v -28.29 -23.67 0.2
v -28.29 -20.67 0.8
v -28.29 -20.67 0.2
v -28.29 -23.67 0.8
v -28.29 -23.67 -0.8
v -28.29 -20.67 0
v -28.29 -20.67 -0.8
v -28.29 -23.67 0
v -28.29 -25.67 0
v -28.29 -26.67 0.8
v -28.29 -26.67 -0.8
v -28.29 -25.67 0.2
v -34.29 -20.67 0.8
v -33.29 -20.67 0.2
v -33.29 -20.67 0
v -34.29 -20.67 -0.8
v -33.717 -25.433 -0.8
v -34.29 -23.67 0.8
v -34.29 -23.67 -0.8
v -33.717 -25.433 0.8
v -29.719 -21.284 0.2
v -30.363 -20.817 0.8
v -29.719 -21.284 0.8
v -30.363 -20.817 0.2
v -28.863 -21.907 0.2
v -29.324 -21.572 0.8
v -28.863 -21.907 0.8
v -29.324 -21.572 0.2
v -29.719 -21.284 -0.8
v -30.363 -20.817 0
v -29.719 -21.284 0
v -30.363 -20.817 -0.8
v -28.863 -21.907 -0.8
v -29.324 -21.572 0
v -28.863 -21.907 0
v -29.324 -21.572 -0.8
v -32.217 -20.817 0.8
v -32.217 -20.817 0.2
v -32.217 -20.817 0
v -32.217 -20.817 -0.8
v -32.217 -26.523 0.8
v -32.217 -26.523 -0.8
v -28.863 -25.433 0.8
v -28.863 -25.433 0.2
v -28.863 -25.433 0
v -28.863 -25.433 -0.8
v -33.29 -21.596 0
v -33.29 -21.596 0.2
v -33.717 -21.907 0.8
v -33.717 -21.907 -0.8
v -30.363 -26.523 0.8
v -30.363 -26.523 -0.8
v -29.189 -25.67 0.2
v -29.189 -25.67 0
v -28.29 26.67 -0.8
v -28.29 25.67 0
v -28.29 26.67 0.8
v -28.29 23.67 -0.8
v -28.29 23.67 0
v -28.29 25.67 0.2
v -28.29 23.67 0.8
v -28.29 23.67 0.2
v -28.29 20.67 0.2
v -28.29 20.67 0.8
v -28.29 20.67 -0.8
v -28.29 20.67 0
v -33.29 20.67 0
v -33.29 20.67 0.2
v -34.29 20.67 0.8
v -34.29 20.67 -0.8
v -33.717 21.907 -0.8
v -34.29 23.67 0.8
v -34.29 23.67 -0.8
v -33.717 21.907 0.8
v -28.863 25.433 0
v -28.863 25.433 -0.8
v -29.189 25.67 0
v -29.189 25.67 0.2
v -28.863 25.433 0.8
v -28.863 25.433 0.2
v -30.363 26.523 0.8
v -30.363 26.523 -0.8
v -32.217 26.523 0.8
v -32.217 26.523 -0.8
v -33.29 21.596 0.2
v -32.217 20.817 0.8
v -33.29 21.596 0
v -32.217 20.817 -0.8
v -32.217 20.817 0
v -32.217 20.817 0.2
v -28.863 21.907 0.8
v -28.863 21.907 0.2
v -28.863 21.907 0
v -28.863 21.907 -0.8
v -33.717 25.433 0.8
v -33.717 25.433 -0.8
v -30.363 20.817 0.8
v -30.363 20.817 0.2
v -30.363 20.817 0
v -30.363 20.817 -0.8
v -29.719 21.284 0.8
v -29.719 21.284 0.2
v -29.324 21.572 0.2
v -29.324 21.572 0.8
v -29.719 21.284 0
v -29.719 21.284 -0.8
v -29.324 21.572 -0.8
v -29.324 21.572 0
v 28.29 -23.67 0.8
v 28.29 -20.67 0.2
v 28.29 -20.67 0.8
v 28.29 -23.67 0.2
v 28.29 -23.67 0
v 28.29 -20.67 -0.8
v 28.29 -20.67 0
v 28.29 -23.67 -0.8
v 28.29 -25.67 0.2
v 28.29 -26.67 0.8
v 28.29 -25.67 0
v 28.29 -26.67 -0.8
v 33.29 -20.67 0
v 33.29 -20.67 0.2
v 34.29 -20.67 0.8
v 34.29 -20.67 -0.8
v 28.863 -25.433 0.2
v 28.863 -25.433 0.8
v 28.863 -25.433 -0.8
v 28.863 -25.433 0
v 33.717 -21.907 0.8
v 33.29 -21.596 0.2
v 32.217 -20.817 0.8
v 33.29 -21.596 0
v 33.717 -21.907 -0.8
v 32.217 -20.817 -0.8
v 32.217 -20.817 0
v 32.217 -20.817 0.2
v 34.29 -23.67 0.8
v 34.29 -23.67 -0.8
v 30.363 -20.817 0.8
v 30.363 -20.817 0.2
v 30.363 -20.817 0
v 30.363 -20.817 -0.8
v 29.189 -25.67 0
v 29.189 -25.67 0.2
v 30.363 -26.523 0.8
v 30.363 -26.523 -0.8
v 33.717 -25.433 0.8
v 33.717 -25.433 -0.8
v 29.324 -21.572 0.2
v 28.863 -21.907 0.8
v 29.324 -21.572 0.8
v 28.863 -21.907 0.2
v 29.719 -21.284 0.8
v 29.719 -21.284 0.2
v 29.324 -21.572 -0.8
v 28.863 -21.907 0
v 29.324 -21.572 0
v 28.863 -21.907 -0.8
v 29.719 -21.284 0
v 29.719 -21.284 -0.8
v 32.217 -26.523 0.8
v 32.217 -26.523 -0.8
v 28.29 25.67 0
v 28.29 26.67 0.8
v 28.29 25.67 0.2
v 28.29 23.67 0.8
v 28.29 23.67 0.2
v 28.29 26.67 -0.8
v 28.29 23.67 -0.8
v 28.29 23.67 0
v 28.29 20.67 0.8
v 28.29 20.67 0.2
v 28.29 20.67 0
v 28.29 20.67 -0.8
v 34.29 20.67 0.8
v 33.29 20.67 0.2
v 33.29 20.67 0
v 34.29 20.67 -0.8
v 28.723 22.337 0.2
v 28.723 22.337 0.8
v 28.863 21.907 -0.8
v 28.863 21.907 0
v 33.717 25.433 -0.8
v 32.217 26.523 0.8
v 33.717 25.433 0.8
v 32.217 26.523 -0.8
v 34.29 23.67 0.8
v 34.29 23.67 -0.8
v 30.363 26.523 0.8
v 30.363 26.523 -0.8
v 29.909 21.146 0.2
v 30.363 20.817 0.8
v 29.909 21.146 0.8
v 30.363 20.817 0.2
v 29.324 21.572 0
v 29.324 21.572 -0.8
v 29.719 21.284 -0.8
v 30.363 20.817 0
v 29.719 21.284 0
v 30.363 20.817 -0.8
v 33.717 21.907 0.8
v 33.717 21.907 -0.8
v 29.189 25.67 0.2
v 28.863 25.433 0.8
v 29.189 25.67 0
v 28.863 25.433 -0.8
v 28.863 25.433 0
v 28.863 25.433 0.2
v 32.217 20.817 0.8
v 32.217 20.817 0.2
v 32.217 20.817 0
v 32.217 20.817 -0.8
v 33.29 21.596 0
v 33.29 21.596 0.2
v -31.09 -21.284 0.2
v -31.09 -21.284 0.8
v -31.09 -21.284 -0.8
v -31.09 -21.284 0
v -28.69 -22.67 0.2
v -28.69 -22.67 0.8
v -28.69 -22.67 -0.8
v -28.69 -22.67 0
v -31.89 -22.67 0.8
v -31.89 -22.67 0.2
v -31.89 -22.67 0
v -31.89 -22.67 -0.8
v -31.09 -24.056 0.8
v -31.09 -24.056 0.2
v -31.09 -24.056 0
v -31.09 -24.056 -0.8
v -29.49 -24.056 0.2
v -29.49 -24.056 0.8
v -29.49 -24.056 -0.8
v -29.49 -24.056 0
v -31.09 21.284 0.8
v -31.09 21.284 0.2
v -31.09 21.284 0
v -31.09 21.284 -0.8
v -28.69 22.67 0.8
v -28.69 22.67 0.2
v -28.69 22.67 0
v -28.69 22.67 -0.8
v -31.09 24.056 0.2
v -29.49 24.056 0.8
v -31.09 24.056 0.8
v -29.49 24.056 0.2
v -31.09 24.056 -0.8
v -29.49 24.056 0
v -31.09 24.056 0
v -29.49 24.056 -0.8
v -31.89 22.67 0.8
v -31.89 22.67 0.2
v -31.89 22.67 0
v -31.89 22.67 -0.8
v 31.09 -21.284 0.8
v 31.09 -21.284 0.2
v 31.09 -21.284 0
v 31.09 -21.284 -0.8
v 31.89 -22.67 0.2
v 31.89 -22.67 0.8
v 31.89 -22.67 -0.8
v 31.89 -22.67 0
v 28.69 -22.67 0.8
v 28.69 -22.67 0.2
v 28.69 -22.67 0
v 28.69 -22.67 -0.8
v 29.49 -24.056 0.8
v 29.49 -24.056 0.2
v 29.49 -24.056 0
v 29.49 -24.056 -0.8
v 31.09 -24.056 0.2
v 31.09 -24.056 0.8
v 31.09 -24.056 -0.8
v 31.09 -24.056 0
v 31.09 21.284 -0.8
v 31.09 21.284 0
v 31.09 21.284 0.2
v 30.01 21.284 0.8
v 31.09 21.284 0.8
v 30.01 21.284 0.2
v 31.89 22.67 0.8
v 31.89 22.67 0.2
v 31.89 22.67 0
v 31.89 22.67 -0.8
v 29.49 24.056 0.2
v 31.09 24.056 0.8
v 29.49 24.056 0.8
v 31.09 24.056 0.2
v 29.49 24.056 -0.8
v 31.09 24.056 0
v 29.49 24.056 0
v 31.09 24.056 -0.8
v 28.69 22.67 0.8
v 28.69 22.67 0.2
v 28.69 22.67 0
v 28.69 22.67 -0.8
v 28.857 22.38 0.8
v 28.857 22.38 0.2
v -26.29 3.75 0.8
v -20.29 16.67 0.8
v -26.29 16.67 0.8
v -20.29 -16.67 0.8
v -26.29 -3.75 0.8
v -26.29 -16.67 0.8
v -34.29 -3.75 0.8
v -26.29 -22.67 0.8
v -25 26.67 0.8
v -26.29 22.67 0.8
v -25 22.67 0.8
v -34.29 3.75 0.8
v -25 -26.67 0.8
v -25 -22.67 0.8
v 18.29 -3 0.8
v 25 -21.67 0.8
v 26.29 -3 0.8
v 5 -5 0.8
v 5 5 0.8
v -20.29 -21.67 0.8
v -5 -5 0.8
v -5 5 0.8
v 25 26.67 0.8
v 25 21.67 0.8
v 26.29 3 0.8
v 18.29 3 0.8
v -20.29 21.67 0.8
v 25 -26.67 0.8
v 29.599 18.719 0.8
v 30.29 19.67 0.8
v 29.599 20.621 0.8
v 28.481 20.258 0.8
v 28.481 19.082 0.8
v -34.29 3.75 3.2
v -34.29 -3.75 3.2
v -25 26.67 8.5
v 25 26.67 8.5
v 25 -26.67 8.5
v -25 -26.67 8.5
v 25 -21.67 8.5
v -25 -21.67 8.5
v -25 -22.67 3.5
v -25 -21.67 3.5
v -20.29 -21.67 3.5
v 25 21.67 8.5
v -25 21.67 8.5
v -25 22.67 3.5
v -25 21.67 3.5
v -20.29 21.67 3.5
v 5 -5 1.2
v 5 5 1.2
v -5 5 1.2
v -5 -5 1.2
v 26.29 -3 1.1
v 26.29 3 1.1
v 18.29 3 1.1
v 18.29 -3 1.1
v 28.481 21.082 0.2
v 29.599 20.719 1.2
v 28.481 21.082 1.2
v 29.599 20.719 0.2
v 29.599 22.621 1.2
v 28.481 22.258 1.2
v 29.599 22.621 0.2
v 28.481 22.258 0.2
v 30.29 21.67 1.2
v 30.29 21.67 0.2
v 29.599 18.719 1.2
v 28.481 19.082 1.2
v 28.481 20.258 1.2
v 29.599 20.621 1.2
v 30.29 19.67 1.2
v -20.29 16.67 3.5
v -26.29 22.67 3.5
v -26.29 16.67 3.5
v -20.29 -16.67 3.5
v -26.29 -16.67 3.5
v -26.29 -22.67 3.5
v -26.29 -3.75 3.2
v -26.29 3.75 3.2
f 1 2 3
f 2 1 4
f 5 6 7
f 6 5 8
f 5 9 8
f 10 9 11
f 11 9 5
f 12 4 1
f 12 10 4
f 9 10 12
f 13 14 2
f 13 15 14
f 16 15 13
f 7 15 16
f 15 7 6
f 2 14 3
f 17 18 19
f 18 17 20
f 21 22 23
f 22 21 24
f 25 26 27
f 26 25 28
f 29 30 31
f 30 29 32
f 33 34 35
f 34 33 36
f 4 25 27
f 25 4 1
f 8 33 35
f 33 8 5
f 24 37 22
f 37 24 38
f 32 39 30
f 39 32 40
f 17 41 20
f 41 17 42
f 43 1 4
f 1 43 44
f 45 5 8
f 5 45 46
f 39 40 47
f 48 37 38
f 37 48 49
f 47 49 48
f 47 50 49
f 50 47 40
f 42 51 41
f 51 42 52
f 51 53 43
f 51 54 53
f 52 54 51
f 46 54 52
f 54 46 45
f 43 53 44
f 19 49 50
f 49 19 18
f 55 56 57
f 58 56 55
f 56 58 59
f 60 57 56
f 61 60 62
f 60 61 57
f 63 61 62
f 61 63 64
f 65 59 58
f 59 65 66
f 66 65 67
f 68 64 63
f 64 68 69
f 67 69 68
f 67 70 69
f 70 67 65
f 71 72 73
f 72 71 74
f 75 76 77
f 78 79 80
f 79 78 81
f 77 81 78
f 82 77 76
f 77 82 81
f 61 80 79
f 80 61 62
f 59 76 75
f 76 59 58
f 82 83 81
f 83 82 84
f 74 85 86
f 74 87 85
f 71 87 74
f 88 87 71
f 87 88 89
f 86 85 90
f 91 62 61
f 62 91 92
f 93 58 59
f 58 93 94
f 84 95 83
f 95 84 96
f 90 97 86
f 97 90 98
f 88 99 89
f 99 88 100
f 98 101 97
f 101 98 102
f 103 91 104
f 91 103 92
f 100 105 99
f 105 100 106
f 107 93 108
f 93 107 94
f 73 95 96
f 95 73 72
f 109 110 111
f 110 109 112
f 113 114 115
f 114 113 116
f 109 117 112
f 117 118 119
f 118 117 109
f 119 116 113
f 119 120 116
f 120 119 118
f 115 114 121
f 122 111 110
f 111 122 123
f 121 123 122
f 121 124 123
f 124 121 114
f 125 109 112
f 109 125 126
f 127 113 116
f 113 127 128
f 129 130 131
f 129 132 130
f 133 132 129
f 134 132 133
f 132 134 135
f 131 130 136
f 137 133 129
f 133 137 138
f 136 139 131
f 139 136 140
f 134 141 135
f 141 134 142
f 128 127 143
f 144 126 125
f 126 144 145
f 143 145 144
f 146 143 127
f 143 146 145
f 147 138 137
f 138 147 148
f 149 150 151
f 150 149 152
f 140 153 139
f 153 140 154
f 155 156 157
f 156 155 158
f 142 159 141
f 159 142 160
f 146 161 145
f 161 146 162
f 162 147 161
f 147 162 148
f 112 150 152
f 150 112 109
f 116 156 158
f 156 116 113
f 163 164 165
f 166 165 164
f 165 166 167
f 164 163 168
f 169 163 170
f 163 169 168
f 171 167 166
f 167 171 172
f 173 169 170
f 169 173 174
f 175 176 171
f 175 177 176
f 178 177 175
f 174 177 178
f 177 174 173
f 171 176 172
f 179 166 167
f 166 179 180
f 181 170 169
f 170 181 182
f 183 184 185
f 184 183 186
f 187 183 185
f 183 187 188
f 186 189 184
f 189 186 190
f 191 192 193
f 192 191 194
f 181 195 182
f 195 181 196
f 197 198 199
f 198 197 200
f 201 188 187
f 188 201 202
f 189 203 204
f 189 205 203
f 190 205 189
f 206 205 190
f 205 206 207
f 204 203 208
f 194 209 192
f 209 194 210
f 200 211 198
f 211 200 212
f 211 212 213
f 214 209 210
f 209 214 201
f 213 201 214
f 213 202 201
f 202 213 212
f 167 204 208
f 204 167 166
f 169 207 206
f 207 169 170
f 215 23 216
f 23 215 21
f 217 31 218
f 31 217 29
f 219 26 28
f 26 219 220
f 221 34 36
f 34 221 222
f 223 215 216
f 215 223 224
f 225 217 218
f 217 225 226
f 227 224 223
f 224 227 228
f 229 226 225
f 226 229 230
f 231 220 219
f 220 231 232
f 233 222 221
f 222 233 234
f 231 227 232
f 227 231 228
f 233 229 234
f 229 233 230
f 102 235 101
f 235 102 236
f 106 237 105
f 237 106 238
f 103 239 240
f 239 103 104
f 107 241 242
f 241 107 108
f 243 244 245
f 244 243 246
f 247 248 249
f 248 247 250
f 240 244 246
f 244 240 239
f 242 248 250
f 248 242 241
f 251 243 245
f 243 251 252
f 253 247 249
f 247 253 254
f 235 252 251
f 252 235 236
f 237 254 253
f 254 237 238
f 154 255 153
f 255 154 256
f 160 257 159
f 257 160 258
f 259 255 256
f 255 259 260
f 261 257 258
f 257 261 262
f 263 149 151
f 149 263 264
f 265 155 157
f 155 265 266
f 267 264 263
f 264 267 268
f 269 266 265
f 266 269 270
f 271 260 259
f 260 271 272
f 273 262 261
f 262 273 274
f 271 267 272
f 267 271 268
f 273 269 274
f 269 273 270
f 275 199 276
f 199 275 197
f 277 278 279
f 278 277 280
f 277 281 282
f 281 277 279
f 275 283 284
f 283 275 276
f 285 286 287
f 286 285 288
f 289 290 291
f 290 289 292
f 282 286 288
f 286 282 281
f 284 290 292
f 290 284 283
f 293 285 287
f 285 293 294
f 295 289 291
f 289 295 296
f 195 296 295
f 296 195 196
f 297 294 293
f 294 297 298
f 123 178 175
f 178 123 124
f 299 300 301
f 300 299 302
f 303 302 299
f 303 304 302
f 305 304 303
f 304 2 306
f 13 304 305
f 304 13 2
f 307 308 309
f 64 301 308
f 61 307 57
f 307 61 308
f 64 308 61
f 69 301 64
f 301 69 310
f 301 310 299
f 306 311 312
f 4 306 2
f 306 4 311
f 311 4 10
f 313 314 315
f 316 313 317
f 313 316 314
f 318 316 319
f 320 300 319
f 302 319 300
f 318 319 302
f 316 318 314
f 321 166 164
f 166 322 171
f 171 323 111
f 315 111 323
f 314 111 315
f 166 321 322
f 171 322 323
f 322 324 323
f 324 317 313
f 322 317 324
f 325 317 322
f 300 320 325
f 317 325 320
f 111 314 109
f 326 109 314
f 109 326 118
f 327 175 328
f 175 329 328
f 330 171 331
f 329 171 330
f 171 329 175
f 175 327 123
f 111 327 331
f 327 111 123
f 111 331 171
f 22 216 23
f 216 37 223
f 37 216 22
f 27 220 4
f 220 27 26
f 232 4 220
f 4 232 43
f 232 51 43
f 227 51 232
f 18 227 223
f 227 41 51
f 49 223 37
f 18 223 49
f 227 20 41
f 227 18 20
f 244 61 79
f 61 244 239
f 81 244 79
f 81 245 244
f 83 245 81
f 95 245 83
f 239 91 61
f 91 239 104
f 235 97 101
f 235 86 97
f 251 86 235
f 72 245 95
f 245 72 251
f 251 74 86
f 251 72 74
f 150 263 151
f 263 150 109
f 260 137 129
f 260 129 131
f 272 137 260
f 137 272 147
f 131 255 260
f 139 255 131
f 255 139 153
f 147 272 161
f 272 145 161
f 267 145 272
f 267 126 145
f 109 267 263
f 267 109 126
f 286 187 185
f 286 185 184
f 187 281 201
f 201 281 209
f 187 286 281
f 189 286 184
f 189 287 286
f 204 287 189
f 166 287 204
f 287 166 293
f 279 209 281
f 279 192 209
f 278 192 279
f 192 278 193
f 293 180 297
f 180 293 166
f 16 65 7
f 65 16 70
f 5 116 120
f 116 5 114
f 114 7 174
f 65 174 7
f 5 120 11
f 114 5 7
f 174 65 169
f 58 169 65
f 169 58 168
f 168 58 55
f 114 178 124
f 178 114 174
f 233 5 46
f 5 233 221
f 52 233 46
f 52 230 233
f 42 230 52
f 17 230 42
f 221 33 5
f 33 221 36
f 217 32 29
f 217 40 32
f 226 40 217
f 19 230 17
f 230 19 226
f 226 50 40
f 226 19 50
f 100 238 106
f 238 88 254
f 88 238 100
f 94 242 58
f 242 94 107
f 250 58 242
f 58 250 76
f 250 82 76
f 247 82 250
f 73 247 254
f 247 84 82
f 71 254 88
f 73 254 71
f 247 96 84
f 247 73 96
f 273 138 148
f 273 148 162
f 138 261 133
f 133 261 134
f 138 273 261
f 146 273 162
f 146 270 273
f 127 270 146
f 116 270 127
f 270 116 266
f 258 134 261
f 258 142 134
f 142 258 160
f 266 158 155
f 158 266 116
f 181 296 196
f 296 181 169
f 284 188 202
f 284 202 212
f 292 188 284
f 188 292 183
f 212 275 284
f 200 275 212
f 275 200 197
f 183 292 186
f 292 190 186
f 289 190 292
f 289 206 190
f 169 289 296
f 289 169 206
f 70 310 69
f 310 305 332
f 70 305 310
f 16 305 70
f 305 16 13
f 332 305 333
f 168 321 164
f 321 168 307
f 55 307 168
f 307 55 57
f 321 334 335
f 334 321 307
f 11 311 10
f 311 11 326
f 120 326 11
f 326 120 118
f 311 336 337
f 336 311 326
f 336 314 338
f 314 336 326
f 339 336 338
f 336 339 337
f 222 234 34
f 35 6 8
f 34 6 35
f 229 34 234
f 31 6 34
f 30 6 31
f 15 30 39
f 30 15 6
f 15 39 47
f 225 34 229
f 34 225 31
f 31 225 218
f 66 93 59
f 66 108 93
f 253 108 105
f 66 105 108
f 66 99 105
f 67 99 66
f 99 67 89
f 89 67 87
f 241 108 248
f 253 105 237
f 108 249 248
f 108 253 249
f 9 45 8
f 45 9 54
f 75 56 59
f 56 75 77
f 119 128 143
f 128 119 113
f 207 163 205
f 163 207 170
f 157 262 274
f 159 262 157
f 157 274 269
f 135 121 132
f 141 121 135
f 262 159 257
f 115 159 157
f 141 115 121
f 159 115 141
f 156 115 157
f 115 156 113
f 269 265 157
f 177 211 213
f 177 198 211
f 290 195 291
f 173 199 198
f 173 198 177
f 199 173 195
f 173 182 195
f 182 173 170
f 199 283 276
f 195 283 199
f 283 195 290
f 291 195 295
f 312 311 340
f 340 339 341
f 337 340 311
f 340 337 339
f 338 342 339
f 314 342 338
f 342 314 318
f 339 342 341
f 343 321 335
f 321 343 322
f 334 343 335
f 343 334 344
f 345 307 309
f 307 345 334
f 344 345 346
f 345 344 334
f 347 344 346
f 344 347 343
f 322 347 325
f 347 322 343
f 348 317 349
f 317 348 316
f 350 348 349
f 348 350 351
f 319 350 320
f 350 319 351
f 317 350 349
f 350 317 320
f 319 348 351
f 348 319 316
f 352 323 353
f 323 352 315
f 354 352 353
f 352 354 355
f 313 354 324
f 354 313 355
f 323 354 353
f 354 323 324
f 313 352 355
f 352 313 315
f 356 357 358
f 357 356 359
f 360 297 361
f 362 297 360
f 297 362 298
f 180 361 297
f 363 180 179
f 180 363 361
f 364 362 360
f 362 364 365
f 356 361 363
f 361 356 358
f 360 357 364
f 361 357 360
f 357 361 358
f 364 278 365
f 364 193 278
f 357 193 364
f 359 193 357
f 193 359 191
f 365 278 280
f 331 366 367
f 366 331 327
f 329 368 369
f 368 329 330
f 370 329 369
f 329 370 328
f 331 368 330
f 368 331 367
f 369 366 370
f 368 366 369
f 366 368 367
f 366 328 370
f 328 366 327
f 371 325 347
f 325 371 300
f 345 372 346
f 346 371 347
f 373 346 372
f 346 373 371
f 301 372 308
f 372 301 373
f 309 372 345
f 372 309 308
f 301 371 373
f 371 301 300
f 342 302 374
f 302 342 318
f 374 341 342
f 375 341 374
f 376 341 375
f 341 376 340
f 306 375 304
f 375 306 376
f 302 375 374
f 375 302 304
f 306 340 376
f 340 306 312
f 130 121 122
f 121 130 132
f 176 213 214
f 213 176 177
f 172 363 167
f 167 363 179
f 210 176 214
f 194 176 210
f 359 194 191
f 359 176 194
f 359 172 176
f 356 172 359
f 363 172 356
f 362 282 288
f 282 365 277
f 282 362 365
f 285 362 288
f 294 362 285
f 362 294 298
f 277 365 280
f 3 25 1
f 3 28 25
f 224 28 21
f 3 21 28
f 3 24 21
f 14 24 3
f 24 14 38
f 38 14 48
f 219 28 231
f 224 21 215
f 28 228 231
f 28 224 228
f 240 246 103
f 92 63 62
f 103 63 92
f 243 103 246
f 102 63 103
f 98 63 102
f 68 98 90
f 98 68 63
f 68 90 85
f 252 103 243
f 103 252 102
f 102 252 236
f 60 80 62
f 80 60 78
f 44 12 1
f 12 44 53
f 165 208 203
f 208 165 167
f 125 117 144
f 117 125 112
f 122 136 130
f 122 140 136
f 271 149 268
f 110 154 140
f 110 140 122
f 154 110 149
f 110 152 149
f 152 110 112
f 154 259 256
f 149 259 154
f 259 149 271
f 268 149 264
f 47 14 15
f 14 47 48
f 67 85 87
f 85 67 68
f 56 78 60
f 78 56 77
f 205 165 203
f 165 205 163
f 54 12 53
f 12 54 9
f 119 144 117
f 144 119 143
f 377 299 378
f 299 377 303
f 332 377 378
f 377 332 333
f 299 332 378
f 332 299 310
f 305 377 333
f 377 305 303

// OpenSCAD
// Parameters
pcb_L = 68.58; //[34.29:137.16:0.01]
pcb_W = 53.34; //[26.67:106.68:0.01]
pcb_T = 1.6; //[0.8:3.2:0.1]
corner_R = 3.0; //[1.5:6.0:0.1]
hole_d = 3.2; //[2.0:4.5:0.1]
hole_edge_margin = 4.0; //[2.0:8.0:0.1]
silk_T = 0.2; //[0.05:0.5:0.05]
silk_inset = 1.0; //[0.5:3.0:0.1]
header_L = 50.0; //[25.0:100.0:0.5]
header_W = 5.0; //[3.0:10.0:0.1]
header_H = 8.5; //[4.0:15.0:0.1]
usb_L = 8.0; //[5.0:16.0:0.1]
usb_W = 7.5; //[5.0:14.0:0.1]
usb_H = 3.2; //[2.0:6.0:0.1]
ic1_L = 10.0; //[5.0:20.0:0.1]
ic1_W = 10.0; //[5.0:20.0:0.1]
ic1_H = 1.2; //[0.6:3.0:0.1]
ic2_L = 8.0; //[4.0:16.0:0.1]
ic2_W = 6.0; //[3.0:12.0:0.1]
ic2_H = 1.1; //[0.6:3.0:0.1]
led_r = 1.0; //[0.5:2.5:0.1]
led_h = 1.2; //[0.6:3.0:0.1]
button_L = 6.0; //[3.0:12.0:0.1]
button_W = 6.0; //[3.0:12.0:0.1]
button_H = 3.5; //[2.0:8.0:0.1]
overlap = 0.8; //[0.5:2.0:0.1]

// PCB with rounded corners and mounting holes
module pcb_with_mounting_holes() {
  difference() {
    // Main PCB body
    color([0.0, 0.4, 0.2]) // Green PCB
    cube([pcb_L, pcb_W, pcb_T], center=true);

    // Edge rounding cutouts
    for (x = [-1, 1], y = [-1, 1]) {
      translate([x * (pcb_L/2 - corner_R), y * (pcb_W/2 - corner_R), 0])
        difference() {
          cube([corner_R*2, corner_R*2, pcb_T + 2*overlap], center=true);
          cylinder(r=corner_R, h=pcb_T + 2*overlap, center=true);
        }
    }

    // Mounting holes
    for (x = [-1, 1], y = [-1, 1]) {
      translate([x * (pcb_L/2 - hole_edge_margin), y * (pcb_W/2 - hole_edge_margin), 0])
        cylinder(r=hole_d/2, h=pcb_T + 2*overlap, center=true);
    }
  }
}

// Silkscreen markings
module silkscreen_markings() {
  color("White")
  translate([0, 0, pcb_T/2 + silk_T/2 - overlap])
    cube([pcb_L - 2*silk_inset, pcb_W - 2*silk_inset, silk_T], center=true);
}

// Headers
module connectors_headers() {
  color("Black")
  translate([0, -pcb_W/2 + header_W/2, pcb_T/2 + header_H/2 - overlap])
    cube([header_L, header_W, header_H], center=true);
  translate([0, pcb_W/2 - header_W/2, pcb_T/2 + header_H/2 - overlap])
    cube([header_L, header_W, header_H], center=true);
}

// USB Connector
module usb_connector() {
  color("Silver")
  translate([-pcb_L/2 + usb_L/2, 0, pcb_T/2 + usb_H/2 - overlap])
    cube([usb_L, usb_W, usb_H], center=true);
}

// IC Packages
module ic_packages() {
  color("DimGray")
  translate([0, 0, pcb_T/2 + ic1_H/2 - overlap])
    cube([ic1_L, ic1_W, ic1_H], center=true);
  translate([pcb_L/2 - (usb_L + ic2_L/2), 0, pcb_T/2 + ic2_H/2 - overlap])
    cube([ic2_L, ic2_W, ic2_H], center=true);
}

// LEDs
module leds() {
  color("Red")
  translate([pcb_L/2 - (hole_edge_margin + led_r), pcb_W/2 - (hole_edge_margin + led_r), pcb_T/2 + led_h/2 - overlap])
    cylinder(r=led_r, h=led_h, center=true);
  translate([pcb_L/2 - (hole_edge_margin + led_r), pcb_W/2 - (hole_edge_margin + 3*led_r), pcb_T/2 + led_h/2 - overlap])
    cylinder(r=led_r, h=led_h, center=true);
}

// Buttons
module buttons() {
  color("Blue")
  translate([-pcb_L/2 + (usb_L + button_L/2), pcb_W/2 - (hole_edge_margin + button_W/2), pcb_T/2 + button_H/2 - overlap])
    cube([button_L, button_W, button_H], center=true);
  translate([-pcb_L/2 + (usb_L + button_L/2), -pcb_W/2 + (hole_edge_margin + button_W/2), pcb_T/2 + button_H/2 - overlap])
    cube([button_L, button_W, button_H], center=true);
}

// Complete board assembly
module complete_board_union() {
  union() {
    pcb_with_mounting_holes();
    silkscreen_markings();
    connectors_headers();
    usb_connector();
    ic_packages();
    leds();
    buttons();
  }
}

// Final output
complete_board_union();
